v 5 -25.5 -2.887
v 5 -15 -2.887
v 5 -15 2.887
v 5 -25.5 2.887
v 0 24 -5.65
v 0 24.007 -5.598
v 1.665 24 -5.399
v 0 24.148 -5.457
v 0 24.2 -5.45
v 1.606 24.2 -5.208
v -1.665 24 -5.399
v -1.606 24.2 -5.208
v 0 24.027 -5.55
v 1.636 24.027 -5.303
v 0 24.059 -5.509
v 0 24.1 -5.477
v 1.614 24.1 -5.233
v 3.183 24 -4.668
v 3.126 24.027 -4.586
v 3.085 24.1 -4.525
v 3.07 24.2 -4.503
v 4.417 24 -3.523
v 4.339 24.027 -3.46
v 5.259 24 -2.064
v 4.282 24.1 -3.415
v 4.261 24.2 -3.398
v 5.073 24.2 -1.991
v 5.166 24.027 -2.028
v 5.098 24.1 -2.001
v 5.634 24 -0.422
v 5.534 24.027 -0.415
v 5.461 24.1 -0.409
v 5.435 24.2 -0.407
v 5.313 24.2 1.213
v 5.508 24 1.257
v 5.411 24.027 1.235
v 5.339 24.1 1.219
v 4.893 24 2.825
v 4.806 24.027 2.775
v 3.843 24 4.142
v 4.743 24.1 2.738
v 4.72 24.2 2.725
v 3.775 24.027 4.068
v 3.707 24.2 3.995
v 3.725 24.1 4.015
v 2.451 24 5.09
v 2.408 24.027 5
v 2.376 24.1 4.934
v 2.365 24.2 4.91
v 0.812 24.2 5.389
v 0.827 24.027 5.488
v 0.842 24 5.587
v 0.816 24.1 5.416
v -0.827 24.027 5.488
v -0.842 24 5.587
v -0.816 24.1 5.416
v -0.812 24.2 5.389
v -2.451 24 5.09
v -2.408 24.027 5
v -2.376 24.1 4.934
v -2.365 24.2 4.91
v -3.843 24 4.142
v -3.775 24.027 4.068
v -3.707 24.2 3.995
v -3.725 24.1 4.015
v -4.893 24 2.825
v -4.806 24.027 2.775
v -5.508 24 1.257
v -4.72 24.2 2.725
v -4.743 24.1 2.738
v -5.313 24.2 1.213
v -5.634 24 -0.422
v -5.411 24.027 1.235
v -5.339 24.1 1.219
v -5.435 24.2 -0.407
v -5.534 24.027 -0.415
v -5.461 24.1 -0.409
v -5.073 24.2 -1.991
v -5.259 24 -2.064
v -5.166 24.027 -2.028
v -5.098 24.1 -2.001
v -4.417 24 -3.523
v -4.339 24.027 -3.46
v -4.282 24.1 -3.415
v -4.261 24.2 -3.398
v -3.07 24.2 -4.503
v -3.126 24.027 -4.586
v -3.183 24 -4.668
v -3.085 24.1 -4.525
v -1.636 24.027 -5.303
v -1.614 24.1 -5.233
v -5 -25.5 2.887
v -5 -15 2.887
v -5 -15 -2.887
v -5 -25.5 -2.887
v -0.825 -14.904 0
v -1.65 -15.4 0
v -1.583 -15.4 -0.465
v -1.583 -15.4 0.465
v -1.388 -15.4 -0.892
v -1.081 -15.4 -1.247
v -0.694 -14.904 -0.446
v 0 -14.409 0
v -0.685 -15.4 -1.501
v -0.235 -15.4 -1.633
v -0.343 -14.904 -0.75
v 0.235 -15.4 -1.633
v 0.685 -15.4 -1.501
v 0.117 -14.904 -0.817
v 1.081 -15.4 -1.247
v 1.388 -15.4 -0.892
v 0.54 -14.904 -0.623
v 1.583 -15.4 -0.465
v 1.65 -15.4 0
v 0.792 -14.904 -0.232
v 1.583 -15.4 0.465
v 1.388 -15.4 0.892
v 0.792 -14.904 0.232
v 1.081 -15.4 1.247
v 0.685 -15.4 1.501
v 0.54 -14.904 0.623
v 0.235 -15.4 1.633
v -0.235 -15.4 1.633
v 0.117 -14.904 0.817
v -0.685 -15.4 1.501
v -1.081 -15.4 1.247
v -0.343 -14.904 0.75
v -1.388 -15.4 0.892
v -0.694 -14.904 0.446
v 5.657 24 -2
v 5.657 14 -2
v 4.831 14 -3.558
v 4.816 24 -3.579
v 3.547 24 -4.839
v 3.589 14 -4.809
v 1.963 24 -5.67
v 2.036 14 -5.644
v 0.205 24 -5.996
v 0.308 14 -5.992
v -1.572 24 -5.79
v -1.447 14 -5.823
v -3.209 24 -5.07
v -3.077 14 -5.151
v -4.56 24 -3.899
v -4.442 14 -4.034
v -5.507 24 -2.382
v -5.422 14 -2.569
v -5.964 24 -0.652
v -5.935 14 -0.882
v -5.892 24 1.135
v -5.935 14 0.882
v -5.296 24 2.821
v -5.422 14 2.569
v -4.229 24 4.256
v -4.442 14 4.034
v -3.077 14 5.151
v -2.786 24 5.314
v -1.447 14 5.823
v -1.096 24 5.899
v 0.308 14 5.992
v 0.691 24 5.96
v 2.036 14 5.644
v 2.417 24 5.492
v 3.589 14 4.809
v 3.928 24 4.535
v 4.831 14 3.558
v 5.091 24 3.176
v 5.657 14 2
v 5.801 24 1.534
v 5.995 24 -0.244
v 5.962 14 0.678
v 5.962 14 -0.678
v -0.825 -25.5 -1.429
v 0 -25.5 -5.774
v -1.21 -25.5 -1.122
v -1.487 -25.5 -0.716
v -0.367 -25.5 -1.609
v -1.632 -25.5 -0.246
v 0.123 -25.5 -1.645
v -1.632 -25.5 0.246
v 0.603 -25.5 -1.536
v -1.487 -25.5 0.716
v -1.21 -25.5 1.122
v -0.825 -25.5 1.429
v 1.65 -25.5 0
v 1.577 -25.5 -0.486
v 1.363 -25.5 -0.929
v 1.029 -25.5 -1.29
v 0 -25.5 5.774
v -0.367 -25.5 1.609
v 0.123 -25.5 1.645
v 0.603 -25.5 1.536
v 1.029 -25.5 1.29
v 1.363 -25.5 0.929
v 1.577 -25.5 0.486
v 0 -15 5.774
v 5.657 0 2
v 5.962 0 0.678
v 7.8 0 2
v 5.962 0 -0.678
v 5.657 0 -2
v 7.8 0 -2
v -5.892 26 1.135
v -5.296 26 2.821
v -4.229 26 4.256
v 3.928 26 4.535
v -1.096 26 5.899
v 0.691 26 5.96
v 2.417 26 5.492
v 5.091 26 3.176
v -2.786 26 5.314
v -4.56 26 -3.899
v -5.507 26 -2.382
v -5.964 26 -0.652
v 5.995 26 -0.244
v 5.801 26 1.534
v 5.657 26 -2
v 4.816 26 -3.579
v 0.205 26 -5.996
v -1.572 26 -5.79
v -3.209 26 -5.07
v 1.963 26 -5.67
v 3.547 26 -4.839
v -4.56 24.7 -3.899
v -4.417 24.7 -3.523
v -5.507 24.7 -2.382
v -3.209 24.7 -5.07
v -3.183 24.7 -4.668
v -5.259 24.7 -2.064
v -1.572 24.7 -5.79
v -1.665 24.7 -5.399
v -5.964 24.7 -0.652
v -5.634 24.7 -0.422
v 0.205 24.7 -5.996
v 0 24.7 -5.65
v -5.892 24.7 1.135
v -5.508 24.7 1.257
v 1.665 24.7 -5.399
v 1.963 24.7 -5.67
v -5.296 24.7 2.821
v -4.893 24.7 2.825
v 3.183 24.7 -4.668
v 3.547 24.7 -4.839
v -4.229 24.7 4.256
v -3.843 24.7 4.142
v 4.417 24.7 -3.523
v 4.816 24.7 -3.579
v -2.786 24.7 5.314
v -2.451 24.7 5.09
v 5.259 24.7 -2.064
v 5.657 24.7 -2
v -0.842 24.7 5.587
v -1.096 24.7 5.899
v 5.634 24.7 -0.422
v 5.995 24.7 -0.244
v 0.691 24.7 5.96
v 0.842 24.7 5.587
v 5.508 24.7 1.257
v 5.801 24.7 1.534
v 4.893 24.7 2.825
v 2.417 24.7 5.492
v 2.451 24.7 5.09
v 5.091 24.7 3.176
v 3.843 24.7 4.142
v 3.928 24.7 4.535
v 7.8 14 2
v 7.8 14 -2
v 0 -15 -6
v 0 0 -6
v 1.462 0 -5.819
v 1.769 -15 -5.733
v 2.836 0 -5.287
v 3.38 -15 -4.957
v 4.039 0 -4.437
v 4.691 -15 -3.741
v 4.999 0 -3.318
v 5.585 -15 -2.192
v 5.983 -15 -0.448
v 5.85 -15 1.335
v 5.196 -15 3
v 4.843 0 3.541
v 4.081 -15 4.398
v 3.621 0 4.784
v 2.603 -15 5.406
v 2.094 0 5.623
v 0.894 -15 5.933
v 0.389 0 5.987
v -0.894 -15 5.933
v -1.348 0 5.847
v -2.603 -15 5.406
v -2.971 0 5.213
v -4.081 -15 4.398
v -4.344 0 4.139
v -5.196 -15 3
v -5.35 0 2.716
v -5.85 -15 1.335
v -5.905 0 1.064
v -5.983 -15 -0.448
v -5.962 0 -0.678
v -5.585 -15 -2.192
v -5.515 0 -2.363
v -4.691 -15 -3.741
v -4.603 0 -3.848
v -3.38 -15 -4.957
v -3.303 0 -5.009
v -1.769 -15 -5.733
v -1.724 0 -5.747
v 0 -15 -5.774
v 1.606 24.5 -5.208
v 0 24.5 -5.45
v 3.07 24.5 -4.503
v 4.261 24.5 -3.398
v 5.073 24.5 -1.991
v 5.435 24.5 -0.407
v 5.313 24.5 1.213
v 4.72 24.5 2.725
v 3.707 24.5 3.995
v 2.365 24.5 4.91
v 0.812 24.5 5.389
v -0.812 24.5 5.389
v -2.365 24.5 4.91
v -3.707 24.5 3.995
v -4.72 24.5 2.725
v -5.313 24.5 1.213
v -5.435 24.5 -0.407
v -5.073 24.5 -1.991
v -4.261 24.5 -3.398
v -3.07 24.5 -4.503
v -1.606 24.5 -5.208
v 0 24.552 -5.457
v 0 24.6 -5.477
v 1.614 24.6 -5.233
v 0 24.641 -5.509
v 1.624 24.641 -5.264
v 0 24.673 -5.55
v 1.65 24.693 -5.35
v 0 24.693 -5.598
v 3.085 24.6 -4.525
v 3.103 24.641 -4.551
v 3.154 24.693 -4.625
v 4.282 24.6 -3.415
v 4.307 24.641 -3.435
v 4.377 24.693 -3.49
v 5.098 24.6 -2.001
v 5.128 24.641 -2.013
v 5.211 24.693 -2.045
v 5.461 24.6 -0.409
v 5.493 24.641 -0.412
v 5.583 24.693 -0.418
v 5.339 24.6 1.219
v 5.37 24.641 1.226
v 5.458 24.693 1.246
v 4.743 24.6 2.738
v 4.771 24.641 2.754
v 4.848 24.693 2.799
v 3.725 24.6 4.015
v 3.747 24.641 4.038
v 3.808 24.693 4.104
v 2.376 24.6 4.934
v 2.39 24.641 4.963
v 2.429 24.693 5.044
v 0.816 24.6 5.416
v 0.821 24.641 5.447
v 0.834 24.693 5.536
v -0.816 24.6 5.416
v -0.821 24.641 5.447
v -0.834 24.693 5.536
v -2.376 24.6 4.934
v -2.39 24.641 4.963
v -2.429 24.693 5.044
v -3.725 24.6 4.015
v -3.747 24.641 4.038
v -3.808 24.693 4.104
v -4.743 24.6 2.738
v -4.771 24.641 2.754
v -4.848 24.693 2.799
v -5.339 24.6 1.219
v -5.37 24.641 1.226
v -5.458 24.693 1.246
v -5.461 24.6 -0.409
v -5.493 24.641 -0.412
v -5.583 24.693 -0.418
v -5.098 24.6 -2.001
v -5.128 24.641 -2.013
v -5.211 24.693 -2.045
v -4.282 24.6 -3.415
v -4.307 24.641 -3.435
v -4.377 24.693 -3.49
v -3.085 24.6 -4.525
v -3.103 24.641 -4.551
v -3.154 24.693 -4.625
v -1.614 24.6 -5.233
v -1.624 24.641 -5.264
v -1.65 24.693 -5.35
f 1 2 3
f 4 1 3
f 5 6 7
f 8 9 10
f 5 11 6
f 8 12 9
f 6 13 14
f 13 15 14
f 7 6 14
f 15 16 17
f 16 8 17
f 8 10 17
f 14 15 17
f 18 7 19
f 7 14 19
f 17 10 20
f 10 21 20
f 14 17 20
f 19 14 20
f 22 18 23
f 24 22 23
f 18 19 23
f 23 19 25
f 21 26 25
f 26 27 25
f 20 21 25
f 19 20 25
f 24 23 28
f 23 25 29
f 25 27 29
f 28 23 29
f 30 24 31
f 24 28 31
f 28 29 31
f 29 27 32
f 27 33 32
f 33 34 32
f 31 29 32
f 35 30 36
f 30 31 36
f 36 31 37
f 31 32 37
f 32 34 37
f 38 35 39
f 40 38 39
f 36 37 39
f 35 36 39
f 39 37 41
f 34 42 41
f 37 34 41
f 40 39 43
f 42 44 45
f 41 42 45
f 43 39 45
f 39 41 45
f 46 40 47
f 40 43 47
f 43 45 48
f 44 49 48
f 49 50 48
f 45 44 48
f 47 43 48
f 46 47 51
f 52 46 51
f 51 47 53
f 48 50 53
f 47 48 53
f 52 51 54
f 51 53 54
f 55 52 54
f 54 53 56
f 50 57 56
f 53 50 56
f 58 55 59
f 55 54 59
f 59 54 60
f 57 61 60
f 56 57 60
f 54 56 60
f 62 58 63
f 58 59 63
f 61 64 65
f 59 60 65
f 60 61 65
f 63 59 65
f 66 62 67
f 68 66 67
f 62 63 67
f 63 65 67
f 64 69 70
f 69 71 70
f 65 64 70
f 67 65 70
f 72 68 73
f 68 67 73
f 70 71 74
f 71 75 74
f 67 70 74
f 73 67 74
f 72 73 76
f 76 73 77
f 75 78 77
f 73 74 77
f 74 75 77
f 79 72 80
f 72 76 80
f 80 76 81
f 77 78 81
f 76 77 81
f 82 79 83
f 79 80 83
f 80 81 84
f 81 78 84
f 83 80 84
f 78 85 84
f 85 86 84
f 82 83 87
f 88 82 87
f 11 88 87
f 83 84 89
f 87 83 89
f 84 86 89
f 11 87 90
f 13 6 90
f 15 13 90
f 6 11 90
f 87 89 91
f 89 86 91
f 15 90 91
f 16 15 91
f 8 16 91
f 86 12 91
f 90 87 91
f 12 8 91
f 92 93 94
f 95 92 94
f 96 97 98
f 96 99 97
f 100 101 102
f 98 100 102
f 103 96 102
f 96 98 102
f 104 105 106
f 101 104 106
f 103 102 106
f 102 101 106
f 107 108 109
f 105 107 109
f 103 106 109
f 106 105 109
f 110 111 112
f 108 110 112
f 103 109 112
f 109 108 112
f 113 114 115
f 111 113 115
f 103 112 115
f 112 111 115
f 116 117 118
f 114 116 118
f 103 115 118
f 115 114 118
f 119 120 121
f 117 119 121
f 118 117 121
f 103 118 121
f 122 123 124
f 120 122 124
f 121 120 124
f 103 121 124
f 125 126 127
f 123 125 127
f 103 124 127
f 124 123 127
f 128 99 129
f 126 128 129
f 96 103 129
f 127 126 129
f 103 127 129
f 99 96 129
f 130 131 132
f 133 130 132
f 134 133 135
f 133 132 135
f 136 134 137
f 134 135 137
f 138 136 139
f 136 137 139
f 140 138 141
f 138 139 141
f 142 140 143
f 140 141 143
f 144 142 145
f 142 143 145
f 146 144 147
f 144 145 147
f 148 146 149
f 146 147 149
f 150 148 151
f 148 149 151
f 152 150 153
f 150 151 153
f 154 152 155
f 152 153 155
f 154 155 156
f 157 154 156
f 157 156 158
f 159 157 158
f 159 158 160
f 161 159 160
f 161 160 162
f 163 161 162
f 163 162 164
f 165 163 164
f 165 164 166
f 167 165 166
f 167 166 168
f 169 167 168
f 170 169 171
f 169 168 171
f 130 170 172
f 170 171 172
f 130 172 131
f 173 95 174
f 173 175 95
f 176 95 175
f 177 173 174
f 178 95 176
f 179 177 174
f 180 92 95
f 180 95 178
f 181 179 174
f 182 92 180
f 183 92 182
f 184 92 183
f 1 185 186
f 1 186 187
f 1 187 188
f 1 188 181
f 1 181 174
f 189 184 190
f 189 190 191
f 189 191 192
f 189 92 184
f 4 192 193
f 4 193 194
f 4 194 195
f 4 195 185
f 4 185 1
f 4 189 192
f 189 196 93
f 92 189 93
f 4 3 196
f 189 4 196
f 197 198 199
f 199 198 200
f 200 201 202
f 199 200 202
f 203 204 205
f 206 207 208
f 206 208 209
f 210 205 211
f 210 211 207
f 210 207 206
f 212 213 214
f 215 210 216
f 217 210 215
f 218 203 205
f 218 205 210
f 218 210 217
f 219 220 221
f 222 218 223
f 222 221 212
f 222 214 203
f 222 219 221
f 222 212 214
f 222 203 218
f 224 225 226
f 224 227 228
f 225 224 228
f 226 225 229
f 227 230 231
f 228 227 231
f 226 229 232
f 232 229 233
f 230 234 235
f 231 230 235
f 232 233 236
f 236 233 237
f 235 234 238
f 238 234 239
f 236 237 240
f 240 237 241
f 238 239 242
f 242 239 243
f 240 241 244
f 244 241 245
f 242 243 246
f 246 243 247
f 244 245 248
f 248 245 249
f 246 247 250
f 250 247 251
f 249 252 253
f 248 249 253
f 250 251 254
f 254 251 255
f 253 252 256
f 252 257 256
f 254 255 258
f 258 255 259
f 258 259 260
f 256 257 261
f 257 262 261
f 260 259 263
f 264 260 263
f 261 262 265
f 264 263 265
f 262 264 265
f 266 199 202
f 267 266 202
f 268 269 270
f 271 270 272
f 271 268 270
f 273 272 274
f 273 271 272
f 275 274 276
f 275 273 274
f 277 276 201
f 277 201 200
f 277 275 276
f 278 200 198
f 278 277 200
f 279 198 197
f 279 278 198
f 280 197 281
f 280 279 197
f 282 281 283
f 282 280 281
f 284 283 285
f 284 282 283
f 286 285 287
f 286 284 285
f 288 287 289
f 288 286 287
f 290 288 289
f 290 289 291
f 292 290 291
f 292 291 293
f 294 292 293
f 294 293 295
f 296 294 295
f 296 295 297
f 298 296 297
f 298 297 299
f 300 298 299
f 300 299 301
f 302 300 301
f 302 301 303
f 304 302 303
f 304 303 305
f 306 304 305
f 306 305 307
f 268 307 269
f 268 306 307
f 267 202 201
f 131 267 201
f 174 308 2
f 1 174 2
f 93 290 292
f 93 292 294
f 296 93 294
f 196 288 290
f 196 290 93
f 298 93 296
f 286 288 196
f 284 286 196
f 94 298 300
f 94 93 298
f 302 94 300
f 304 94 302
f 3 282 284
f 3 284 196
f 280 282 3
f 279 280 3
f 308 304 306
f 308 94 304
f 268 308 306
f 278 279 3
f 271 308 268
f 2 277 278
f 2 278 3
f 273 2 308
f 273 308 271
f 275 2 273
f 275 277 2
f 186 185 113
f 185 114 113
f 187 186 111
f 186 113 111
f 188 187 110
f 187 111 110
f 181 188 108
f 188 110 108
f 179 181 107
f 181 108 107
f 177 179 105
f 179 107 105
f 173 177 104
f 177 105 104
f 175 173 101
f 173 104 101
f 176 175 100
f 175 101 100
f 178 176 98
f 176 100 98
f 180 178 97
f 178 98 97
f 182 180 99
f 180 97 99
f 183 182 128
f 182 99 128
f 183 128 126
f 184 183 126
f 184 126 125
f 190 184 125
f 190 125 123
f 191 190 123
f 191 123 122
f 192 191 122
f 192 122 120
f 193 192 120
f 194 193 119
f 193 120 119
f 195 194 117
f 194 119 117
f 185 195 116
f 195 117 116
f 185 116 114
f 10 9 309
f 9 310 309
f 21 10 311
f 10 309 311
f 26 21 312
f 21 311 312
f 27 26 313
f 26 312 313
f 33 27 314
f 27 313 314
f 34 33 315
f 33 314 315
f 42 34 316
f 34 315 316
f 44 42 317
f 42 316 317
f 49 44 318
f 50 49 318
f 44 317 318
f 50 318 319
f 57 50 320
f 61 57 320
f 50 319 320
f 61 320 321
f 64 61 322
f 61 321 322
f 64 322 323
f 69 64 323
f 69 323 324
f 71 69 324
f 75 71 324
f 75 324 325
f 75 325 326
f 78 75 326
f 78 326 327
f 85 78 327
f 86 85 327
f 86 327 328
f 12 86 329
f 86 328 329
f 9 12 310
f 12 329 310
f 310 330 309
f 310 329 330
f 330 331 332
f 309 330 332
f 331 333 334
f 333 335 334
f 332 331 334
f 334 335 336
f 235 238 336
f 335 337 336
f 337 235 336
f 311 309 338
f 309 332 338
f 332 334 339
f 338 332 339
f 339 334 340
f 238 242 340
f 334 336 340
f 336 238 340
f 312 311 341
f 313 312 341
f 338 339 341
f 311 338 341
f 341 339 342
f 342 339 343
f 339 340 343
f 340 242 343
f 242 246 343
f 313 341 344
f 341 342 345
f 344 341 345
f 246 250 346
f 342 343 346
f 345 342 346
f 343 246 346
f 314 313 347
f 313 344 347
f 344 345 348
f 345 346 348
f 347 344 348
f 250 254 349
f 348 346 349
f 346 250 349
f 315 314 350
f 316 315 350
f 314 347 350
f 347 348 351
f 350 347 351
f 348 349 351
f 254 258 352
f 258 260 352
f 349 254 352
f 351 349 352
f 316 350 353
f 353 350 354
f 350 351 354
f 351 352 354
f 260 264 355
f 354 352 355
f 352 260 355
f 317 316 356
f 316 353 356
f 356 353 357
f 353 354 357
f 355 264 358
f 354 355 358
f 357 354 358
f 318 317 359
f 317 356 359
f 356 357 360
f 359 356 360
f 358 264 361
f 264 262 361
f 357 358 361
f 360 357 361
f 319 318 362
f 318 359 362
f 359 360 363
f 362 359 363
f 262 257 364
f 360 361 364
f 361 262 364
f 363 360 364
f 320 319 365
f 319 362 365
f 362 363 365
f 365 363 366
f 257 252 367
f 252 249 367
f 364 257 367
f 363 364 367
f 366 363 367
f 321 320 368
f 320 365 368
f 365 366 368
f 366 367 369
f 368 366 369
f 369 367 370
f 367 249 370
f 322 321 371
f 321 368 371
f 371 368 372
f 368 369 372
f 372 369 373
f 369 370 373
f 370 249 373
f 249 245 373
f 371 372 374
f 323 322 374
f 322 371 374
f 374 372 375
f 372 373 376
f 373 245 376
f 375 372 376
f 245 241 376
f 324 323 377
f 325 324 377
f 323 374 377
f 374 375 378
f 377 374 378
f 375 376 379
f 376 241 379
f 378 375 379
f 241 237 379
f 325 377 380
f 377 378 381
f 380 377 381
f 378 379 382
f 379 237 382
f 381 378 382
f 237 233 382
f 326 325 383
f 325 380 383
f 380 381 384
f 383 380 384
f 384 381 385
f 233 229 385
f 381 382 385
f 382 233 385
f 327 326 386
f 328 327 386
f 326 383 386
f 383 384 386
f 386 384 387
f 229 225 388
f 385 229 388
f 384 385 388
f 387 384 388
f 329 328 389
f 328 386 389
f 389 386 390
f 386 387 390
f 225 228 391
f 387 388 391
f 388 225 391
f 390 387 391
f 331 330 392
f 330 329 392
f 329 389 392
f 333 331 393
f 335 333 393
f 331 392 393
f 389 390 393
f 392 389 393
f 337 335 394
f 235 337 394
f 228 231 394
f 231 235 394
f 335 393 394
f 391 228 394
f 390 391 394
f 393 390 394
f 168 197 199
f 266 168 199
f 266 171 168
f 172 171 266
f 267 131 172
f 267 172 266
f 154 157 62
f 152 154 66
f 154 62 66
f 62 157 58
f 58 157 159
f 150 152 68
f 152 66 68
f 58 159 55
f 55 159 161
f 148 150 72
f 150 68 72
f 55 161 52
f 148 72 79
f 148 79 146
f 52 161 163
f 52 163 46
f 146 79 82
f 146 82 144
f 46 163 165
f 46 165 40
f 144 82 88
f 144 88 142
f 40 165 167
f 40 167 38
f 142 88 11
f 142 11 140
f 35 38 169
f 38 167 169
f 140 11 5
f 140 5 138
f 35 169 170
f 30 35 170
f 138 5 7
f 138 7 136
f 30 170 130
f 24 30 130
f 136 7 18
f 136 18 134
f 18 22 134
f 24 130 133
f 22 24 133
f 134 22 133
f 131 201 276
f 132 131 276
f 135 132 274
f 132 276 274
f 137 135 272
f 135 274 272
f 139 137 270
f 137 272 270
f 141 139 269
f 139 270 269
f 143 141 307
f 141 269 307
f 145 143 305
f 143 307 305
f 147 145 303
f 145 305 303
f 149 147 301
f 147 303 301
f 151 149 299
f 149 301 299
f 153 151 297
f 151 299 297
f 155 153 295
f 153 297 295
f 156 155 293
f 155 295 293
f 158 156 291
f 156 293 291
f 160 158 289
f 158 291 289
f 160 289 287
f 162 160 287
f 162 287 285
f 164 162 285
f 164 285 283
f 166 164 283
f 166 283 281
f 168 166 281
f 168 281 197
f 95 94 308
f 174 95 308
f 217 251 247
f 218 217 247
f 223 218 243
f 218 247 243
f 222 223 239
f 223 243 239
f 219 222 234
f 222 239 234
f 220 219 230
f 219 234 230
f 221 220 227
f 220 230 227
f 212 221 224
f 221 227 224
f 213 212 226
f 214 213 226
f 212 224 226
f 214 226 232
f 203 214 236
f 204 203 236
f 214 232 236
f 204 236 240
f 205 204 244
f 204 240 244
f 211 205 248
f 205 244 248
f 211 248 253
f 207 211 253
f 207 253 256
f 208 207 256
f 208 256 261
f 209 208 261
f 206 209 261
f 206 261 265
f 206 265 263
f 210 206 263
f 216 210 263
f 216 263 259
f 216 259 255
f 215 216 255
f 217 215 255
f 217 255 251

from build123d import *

# Parameters (mm, degrees)
BOSS_EXTRUDE1_DEPTH   = 14
SKETCH2_R             = 6
BOSS_EXTRUDE2_DEPTH   = 12
BOSS_EXTRUDE3_START   = 15
SKETCH3_R             = 6
BOSS_EXTRUDE3_DEPTH   = 15
BOSS_EXTRUDE4_DEPTH   = 10.5
M4_TAPPED_HOLE1_D     = 3.3
M4_TAPPED_HOLE1_DEPTH = 10.1
M4_TAPPED_HOLE1_TIP   = 0.991420021


with BuildPart() as part:
    # Sketch1 → Boss-Extrude1 (new body)
    with BuildSketch(Plane(origin=(0, 0, 0), x_dir=(1, 0, 0), z_dir=(0, 1, 0))):
        with BuildLine():
            Line((7.8, -2), (7.8, 2))
            Line((7.8, 2), (5.656854249, 2))
            ThreePointArc((5.656854249, 2), (-6, 0), (5.656854249, -2))
            Line((5.656854249, -2), (7.8, -2))
        make_face()
    extrude(amount=BOSS_EXTRUDE1_DEPTH)

    # Sketch2 → Boss-Extrude2 (add)
    with BuildSketch(Plane(origin=(0, 14, 0), x_dir=(1, 0, 0), z_dir=(0, 1, 0))):
        with Locations(Location((0, 0, 0), (0, 0, 19.471220634))):
            Circle(SKETCH2_R)
    extrude(amount=BOSS_EXTRUDE2_DEPTH)

    # Sketch3 → Boss-Extrude3 (add)
    with BuildSketch(Plane.XZ.offset(BOSS_EXTRUDE3_START)):
        with Locations(Location((0, 0, 0), (0, 0, 270))):
            Circle(SKETCH3_R)
    extrude(amount=-BOSS_EXTRUDE3_DEPTH)

    # Groove Sketch → Retaining Ring Groove (revolve, cut)
    with BuildSketch(Plane(origin=(1.604252923, 12.182890291, 0.373259529), x_dir=(-0.9343262431877186, 0.2824476966643587, -0.2173885230174828), z_dir=(-0.2266157025474993, 0, 0.9739842521103221)), mode=Mode.PRIVATE) as retaining_ring_groove_sk:
        with BuildLine():
            Line((10.535414006, -9.946396708), (11.998320123, -9.51566397))
            Line((11.998320123, -9.51566397), (11.800606735, -8.84416608))
            Line((11.800606735, -8.84416608), (10.337700618, -9.274898818))
            ThreePointArc((10.337700618, -9.274898818), (10.21858296, -9.371036434), (10.202333617, -9.523244897))
            Line((10.202333617, -9.523244897), (10.287067926, -9.811029707))
            ThreePointArc((10.287067926, -9.811029707), (10.383205542, -9.930147365), (10.535414006, -9.946396708))
        make_face()
    revolve(retaining_ring_groove_sk.sketch.rotate(Axis((0, 60.224615576, 0), (0, -1, 0)), 76.902094509), axis=Axis((0, 60.224615576, 0), (0, -1, 0)), mode=Mode.SUBTRACT)

    # Sketch5 → Boss-Extrude4 (add)
    with BuildSketch(Plane.XZ.offset(15)):
        Polygon((0, 5.773502692), (-5, 2.886751346), (-5, -2.886751346), (0, -5.773502692), (5, -2.886751346), (5, 2.886751346), align=None)
    extrude(amount=BOSS_EXTRUDE4_DEPTH)

    # M4 Tapped Hole1
    with Locations(Plane(origin=(0, -25.5, 0), x_dir=(-1, 0, 0), z_dir=(0, -1, 0))):
        with Locations((0, 0)):
            Hole(M4_TAPPED_HOLE1_D / 2, depth=M4_TAPPED_HOLE1_DEPTH)
            with Locations((0, 0, -(M4_TAPPED_HOLE1_DEPTH + M4_TAPPED_HOLE1_TIP / 2))):  # 118° drill point
                Cone(0, M4_TAPPED_HOLE1_D / 2, M4_TAPPED_HOLE1_TIP, mode=Mode.SUBTRACT)


solid = part.part
